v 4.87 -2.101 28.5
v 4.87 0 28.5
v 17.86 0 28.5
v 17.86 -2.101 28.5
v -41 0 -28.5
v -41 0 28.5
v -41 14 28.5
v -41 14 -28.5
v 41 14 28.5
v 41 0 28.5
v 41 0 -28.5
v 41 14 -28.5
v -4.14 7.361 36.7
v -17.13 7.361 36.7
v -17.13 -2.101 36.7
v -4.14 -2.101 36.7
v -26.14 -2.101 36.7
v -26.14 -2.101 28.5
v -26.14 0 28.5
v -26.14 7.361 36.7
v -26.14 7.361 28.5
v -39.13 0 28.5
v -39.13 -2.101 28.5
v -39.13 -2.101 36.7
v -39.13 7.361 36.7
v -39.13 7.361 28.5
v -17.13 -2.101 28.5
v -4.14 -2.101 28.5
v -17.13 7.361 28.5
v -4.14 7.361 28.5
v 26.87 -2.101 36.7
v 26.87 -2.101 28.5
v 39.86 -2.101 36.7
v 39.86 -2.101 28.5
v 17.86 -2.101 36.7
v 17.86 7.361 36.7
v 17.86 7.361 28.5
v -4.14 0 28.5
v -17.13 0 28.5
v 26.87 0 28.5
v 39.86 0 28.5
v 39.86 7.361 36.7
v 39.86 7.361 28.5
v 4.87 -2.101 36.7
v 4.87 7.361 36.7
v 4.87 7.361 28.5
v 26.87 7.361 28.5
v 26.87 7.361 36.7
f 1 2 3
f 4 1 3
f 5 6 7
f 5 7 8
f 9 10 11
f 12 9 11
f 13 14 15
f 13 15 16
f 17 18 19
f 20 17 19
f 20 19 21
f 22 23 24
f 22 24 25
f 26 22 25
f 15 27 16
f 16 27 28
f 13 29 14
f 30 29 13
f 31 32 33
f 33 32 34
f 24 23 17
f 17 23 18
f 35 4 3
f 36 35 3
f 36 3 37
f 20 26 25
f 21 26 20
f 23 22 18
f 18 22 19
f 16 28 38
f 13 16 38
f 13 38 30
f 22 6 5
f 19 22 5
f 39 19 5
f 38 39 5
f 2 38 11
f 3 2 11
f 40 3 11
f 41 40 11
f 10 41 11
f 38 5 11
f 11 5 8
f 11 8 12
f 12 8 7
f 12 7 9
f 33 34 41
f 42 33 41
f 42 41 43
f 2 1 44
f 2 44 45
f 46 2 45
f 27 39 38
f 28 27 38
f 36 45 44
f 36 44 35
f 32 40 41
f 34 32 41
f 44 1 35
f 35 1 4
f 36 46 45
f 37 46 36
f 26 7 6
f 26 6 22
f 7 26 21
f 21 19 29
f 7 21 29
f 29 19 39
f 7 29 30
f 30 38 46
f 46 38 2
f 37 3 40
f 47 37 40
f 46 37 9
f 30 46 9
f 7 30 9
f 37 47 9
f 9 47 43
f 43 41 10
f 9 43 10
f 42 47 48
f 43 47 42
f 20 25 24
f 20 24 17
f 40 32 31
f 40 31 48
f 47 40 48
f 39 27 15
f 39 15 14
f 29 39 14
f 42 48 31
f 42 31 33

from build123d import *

# Parameters (mm, degrees)
SKETCH_1_W             = 82
SKETCH_1_H             = 57
EXTRUDE_1_DEPTH        = 14
SKETCH_2_W             = 12.989846737
SKETCH_2_H             = 9.461740216
EXTRUDE_2_DEPTH        = 8.2
PATTERN_LINEAR_1_COUNT = 4
PATTERN_LINEAR_1_PITCH = 22


with BuildPart() as part:
    # 草图1 → 凸台-拉伸1 (new body)
    with BuildSketch(Plane(origin=(0, 0, 0), x_dir=(1, 0, 0), z_dir=(0, 1, 0))):
        Rectangle(SKETCH_1_W, SKETCH_1_H)
    extrude(amount=EXTRUDE_1_DEPTH)

    # 草图2 → 凸台-拉伸2 (add)
    with BuildSketch(Plane.XY.offset(28.5)):
        with Locations((-32.634985321, 2.629958968)):
            Rectangle(SKETCH_2_W, SKETCH_2_H)
    extrude_2 = extrude(amount=EXTRUDE_2_DEPTH)

    # 阵列(线性)1: 凸台-拉伸2 ×4
    with Locations(*[(i * PATTERN_LINEAR_1_PITCH, 0, 0) for i in range(1, PATTERN_LINEAR_1_COUNT)]):
        add(extrude_2)


solid = part.part
